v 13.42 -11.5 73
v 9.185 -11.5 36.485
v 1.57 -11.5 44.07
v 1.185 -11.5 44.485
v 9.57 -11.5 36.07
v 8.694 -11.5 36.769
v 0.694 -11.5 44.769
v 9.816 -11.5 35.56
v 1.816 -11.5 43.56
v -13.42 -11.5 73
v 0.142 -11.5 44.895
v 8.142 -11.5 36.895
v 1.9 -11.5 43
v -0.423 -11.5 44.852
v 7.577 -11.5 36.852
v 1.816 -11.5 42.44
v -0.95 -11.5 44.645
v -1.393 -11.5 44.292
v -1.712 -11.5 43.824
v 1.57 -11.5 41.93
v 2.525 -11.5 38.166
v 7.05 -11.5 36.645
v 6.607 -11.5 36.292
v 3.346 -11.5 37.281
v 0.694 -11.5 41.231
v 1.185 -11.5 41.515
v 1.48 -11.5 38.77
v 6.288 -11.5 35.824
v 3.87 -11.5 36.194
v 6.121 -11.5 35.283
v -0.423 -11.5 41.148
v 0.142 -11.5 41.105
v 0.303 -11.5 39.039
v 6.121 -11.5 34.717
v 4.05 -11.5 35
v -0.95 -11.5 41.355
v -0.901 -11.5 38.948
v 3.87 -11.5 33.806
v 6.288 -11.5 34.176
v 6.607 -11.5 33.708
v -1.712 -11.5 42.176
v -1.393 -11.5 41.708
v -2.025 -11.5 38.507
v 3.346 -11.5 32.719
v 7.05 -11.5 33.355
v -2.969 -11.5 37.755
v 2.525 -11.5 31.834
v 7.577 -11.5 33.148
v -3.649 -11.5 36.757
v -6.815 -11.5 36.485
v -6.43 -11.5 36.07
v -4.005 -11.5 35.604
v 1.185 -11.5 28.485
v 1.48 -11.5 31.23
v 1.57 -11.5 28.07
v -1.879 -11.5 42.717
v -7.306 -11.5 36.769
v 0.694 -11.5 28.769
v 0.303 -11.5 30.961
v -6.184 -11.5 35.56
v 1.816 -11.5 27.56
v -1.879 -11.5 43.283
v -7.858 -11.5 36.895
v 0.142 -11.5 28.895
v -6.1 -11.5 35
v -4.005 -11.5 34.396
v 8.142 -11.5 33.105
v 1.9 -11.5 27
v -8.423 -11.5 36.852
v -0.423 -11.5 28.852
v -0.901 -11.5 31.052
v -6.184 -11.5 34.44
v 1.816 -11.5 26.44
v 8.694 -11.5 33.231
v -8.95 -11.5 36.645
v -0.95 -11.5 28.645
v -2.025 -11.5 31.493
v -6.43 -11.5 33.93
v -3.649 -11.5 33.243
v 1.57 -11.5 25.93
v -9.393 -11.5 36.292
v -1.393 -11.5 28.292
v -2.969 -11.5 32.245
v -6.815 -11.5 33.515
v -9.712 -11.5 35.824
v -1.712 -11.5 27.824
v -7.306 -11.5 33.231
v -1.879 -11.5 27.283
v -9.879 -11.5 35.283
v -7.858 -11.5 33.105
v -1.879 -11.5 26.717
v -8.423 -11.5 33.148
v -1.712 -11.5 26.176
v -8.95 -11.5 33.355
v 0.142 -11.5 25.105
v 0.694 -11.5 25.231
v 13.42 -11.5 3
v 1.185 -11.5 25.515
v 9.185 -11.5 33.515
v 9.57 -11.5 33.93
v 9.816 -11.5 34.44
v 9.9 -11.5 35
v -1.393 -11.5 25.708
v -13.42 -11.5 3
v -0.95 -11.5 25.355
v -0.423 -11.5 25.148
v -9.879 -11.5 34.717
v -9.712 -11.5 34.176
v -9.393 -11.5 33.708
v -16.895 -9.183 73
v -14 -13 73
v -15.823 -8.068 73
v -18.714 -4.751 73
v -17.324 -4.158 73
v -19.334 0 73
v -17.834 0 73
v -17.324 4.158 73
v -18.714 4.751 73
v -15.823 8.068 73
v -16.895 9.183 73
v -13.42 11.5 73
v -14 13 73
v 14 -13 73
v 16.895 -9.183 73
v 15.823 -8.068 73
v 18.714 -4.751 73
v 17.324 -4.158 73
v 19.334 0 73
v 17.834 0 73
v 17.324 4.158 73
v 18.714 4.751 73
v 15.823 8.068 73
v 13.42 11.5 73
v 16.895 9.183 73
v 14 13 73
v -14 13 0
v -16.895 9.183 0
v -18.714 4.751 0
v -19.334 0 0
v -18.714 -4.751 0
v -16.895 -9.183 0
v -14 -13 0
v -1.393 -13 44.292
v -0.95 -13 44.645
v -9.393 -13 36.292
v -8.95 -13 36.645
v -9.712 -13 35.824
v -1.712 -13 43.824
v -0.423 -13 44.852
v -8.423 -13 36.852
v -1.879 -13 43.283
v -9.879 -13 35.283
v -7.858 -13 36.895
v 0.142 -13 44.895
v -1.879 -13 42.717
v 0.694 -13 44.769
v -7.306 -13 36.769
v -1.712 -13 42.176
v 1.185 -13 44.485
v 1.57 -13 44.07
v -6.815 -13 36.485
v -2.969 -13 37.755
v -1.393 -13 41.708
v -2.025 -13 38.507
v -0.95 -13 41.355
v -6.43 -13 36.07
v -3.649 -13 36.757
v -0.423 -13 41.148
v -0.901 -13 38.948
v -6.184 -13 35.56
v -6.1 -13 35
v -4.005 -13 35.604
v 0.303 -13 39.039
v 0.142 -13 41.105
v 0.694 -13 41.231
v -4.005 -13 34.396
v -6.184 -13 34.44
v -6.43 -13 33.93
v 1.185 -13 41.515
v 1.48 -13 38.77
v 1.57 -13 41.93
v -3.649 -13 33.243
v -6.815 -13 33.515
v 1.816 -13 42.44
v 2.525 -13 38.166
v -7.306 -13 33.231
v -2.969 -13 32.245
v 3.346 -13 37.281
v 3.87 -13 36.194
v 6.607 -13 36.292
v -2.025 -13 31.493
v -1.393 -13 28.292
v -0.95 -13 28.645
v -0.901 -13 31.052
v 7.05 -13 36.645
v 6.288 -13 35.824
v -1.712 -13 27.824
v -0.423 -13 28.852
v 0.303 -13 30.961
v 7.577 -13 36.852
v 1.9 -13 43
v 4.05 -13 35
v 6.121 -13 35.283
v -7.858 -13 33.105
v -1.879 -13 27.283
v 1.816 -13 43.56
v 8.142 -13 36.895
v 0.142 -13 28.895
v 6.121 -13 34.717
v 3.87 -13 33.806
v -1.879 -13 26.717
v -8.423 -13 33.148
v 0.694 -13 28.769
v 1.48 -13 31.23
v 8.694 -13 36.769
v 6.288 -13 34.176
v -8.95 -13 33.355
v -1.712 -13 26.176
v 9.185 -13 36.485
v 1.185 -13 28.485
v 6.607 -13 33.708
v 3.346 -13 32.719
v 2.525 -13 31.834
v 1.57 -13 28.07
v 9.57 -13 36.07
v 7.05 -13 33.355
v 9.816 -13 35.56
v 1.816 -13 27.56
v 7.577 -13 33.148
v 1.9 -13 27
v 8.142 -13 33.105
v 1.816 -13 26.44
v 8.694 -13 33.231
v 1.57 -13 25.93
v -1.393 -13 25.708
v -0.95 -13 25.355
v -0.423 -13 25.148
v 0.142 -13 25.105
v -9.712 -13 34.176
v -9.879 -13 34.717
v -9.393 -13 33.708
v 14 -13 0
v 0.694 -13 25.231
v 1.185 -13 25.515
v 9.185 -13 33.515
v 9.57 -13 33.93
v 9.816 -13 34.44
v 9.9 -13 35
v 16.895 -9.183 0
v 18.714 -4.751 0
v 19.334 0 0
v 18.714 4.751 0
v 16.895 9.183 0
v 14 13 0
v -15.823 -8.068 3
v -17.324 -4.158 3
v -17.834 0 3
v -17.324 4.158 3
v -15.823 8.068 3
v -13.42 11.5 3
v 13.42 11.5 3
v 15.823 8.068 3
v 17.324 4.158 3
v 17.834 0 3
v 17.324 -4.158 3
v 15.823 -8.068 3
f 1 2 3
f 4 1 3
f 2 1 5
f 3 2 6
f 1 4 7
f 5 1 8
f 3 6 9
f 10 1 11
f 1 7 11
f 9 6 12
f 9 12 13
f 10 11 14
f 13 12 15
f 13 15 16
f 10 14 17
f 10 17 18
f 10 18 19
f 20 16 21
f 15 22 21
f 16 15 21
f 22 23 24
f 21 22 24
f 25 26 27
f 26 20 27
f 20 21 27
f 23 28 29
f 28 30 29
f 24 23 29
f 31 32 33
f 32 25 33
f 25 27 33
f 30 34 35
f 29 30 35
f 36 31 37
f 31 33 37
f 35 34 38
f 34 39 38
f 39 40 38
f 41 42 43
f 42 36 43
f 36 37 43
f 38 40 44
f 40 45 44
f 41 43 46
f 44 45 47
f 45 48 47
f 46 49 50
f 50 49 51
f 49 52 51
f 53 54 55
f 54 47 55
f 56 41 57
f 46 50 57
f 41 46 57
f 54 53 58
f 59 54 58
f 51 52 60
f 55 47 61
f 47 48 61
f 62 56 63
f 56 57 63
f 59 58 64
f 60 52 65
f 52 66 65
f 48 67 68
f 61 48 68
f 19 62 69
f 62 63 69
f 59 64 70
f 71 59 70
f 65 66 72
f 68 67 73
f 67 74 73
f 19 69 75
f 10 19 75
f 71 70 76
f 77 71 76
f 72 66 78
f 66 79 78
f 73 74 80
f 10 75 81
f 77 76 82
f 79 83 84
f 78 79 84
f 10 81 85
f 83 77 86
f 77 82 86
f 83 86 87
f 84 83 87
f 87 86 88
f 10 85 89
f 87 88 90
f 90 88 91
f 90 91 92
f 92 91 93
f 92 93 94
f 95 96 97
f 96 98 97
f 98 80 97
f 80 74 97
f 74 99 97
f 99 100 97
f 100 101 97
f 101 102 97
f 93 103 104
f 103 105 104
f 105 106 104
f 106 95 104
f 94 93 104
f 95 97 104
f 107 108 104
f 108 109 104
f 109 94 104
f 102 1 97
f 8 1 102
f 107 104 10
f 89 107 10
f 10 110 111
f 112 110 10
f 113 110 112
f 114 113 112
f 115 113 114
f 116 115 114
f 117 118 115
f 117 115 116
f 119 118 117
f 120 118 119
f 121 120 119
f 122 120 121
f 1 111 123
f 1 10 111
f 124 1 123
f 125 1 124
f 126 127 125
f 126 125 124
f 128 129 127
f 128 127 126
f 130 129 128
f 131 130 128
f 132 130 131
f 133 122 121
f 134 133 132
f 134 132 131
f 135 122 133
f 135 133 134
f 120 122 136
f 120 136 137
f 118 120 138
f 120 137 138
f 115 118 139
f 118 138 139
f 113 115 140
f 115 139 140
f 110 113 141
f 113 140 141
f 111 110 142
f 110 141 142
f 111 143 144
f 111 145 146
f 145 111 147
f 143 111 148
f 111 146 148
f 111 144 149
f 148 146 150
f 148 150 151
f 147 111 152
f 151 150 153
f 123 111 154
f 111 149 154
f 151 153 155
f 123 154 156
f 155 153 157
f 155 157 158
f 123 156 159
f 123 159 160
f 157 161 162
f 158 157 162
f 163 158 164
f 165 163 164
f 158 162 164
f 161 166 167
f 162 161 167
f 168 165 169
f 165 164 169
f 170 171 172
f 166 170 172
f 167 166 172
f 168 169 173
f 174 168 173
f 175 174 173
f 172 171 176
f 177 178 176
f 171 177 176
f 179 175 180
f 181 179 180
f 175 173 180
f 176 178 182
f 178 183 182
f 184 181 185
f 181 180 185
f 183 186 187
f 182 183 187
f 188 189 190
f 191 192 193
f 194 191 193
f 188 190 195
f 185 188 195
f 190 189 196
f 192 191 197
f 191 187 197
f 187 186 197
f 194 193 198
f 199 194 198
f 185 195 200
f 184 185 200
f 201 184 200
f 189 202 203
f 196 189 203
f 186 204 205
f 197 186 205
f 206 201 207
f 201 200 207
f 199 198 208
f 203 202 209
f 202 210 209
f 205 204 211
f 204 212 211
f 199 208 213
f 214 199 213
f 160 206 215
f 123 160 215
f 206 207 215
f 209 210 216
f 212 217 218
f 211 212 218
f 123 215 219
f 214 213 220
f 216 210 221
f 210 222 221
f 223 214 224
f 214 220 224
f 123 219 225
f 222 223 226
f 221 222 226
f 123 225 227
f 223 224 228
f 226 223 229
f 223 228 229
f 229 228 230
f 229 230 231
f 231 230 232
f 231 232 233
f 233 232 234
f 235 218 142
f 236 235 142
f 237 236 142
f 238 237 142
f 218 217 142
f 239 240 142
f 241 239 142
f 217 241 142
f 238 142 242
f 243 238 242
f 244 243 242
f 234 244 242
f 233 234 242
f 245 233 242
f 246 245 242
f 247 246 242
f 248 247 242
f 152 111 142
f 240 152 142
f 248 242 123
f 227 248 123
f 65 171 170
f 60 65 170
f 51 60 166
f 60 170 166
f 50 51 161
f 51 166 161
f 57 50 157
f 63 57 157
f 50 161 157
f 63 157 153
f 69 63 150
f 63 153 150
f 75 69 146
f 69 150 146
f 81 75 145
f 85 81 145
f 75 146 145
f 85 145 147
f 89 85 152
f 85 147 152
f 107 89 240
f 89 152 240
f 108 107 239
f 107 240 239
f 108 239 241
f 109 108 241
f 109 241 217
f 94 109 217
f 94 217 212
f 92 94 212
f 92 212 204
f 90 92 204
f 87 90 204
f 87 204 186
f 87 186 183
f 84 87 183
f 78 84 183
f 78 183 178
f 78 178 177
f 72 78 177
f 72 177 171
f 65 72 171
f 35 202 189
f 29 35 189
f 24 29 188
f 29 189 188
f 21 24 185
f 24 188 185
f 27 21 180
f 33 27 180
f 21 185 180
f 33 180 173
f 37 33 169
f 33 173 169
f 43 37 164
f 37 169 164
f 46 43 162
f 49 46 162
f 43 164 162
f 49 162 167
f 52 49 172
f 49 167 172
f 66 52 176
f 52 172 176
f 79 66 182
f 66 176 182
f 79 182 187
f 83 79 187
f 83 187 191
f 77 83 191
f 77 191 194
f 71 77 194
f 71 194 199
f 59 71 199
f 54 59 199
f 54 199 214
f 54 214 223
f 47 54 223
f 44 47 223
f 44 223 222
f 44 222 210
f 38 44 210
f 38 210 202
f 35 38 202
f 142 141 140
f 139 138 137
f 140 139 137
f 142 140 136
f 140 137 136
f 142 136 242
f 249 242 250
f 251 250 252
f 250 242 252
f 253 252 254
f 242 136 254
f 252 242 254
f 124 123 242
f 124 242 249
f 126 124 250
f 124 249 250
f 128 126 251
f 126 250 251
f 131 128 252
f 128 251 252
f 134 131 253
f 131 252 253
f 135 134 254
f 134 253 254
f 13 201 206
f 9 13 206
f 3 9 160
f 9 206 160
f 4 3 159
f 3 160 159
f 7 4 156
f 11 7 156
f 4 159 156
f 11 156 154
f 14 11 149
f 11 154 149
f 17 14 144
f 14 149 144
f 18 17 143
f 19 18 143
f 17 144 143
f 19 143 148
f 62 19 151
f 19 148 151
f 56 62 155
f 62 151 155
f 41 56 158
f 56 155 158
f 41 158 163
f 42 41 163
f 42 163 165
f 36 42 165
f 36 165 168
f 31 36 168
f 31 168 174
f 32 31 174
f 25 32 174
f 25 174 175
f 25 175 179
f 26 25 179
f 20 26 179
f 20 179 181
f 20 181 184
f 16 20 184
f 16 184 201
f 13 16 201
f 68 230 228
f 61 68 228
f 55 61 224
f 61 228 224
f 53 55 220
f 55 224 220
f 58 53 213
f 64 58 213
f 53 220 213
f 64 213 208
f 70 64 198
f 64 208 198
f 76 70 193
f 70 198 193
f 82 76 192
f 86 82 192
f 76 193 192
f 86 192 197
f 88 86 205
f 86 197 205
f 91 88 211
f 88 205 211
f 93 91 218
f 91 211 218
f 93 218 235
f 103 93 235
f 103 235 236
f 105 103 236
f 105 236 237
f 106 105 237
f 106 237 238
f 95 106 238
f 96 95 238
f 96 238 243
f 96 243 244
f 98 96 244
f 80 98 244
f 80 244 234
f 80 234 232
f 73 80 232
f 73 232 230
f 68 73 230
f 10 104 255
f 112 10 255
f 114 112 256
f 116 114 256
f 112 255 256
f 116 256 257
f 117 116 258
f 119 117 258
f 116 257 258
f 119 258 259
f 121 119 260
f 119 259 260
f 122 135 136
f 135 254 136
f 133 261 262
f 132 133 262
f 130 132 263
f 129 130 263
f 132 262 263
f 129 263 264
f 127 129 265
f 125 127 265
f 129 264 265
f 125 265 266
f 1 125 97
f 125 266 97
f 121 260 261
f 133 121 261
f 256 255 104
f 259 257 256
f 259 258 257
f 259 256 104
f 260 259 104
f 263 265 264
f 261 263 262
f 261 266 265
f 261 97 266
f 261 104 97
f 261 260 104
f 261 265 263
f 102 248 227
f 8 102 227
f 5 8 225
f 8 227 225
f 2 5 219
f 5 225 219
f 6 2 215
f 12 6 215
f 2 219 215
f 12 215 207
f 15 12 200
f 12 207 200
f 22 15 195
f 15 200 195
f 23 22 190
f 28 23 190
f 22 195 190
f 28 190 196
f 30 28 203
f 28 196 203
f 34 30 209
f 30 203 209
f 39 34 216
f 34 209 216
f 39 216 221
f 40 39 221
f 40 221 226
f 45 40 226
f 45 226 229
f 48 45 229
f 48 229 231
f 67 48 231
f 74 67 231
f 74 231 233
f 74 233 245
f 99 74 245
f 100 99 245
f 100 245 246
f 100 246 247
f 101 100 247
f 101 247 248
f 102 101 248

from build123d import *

# Parameters (mm, degrees)
F1_DEPTH = 3
F3_DEPTH = 70
F4_R     = 1.9
F4_R_2   = 4.05
F5_DEPTH = 4


# Not quite as in the source:
# - a feature names something its author has since deleted; it is built from what else it names


with BuildPart() as f1:
    # F0 (on Top) → F1 (new body)
    with BuildSketch(Plane.XY):
        with BuildLine():
            Line((14, 13), (-14, 13))
            ThreePointArc((-14, 13), (-19.3340623478, 0), (-14, -13))
            Line((-14, -13), (14, -13))
            ThreePointArc((14, -13), (19.3340623478, 0), (14, 13))
        make_face()
    extrude(amount=F1_DEPTH)

    # F2 (on face) → F3 (join)
    with BuildSketch(Plane.XY.offset(3)):
        with BuildLine():
            ThreePointArc((14, -13), (19.3340623478, 0), (14, 13))
            Line((14, 13), (-14, 13))
            ThreePointArc((-14, 13), (-19.3340623478, 0), (-14, -13))
            Line((-14, -13), (14, -13))
        make_face()
        with BuildLine():
            Line((13.4202267877, -11.5), (-13.4202267877, -11.5))
            ThreePointArc((-13.4202267877, -11.5), (-17.8340623478, 0), (-13.4202267877, 11.5))
            Line((-13.4202267877, 11.5), (13.4202267877, 11.5))
            ThreePointArc((13.4202267877, 11.5), (17.8340623478, 0), (13.4202267877, -11.5))
        make_face(mode=Mode.SUBTRACT)
    extrude(amount=F3_DEPTH)

    # F4 (on face) → F5 (cut)
    with BuildSketch(Plane.XZ.offset(13)):
        with Locations((-8, 35)):
            Circle(F4_R)
        with Locations((0, 35)):
            Circle(F4_R_2)
        with Locations((8, 35)):
            Circle(F4_R)
        with Locations((0, 43)):
            Circle(F4_R)
        with Locations((0, 27)):
            Circle(F4_R)
    extrude(amount=-F5_DEPTH, mode=Mode.SUBTRACT)


solid = f1.part
